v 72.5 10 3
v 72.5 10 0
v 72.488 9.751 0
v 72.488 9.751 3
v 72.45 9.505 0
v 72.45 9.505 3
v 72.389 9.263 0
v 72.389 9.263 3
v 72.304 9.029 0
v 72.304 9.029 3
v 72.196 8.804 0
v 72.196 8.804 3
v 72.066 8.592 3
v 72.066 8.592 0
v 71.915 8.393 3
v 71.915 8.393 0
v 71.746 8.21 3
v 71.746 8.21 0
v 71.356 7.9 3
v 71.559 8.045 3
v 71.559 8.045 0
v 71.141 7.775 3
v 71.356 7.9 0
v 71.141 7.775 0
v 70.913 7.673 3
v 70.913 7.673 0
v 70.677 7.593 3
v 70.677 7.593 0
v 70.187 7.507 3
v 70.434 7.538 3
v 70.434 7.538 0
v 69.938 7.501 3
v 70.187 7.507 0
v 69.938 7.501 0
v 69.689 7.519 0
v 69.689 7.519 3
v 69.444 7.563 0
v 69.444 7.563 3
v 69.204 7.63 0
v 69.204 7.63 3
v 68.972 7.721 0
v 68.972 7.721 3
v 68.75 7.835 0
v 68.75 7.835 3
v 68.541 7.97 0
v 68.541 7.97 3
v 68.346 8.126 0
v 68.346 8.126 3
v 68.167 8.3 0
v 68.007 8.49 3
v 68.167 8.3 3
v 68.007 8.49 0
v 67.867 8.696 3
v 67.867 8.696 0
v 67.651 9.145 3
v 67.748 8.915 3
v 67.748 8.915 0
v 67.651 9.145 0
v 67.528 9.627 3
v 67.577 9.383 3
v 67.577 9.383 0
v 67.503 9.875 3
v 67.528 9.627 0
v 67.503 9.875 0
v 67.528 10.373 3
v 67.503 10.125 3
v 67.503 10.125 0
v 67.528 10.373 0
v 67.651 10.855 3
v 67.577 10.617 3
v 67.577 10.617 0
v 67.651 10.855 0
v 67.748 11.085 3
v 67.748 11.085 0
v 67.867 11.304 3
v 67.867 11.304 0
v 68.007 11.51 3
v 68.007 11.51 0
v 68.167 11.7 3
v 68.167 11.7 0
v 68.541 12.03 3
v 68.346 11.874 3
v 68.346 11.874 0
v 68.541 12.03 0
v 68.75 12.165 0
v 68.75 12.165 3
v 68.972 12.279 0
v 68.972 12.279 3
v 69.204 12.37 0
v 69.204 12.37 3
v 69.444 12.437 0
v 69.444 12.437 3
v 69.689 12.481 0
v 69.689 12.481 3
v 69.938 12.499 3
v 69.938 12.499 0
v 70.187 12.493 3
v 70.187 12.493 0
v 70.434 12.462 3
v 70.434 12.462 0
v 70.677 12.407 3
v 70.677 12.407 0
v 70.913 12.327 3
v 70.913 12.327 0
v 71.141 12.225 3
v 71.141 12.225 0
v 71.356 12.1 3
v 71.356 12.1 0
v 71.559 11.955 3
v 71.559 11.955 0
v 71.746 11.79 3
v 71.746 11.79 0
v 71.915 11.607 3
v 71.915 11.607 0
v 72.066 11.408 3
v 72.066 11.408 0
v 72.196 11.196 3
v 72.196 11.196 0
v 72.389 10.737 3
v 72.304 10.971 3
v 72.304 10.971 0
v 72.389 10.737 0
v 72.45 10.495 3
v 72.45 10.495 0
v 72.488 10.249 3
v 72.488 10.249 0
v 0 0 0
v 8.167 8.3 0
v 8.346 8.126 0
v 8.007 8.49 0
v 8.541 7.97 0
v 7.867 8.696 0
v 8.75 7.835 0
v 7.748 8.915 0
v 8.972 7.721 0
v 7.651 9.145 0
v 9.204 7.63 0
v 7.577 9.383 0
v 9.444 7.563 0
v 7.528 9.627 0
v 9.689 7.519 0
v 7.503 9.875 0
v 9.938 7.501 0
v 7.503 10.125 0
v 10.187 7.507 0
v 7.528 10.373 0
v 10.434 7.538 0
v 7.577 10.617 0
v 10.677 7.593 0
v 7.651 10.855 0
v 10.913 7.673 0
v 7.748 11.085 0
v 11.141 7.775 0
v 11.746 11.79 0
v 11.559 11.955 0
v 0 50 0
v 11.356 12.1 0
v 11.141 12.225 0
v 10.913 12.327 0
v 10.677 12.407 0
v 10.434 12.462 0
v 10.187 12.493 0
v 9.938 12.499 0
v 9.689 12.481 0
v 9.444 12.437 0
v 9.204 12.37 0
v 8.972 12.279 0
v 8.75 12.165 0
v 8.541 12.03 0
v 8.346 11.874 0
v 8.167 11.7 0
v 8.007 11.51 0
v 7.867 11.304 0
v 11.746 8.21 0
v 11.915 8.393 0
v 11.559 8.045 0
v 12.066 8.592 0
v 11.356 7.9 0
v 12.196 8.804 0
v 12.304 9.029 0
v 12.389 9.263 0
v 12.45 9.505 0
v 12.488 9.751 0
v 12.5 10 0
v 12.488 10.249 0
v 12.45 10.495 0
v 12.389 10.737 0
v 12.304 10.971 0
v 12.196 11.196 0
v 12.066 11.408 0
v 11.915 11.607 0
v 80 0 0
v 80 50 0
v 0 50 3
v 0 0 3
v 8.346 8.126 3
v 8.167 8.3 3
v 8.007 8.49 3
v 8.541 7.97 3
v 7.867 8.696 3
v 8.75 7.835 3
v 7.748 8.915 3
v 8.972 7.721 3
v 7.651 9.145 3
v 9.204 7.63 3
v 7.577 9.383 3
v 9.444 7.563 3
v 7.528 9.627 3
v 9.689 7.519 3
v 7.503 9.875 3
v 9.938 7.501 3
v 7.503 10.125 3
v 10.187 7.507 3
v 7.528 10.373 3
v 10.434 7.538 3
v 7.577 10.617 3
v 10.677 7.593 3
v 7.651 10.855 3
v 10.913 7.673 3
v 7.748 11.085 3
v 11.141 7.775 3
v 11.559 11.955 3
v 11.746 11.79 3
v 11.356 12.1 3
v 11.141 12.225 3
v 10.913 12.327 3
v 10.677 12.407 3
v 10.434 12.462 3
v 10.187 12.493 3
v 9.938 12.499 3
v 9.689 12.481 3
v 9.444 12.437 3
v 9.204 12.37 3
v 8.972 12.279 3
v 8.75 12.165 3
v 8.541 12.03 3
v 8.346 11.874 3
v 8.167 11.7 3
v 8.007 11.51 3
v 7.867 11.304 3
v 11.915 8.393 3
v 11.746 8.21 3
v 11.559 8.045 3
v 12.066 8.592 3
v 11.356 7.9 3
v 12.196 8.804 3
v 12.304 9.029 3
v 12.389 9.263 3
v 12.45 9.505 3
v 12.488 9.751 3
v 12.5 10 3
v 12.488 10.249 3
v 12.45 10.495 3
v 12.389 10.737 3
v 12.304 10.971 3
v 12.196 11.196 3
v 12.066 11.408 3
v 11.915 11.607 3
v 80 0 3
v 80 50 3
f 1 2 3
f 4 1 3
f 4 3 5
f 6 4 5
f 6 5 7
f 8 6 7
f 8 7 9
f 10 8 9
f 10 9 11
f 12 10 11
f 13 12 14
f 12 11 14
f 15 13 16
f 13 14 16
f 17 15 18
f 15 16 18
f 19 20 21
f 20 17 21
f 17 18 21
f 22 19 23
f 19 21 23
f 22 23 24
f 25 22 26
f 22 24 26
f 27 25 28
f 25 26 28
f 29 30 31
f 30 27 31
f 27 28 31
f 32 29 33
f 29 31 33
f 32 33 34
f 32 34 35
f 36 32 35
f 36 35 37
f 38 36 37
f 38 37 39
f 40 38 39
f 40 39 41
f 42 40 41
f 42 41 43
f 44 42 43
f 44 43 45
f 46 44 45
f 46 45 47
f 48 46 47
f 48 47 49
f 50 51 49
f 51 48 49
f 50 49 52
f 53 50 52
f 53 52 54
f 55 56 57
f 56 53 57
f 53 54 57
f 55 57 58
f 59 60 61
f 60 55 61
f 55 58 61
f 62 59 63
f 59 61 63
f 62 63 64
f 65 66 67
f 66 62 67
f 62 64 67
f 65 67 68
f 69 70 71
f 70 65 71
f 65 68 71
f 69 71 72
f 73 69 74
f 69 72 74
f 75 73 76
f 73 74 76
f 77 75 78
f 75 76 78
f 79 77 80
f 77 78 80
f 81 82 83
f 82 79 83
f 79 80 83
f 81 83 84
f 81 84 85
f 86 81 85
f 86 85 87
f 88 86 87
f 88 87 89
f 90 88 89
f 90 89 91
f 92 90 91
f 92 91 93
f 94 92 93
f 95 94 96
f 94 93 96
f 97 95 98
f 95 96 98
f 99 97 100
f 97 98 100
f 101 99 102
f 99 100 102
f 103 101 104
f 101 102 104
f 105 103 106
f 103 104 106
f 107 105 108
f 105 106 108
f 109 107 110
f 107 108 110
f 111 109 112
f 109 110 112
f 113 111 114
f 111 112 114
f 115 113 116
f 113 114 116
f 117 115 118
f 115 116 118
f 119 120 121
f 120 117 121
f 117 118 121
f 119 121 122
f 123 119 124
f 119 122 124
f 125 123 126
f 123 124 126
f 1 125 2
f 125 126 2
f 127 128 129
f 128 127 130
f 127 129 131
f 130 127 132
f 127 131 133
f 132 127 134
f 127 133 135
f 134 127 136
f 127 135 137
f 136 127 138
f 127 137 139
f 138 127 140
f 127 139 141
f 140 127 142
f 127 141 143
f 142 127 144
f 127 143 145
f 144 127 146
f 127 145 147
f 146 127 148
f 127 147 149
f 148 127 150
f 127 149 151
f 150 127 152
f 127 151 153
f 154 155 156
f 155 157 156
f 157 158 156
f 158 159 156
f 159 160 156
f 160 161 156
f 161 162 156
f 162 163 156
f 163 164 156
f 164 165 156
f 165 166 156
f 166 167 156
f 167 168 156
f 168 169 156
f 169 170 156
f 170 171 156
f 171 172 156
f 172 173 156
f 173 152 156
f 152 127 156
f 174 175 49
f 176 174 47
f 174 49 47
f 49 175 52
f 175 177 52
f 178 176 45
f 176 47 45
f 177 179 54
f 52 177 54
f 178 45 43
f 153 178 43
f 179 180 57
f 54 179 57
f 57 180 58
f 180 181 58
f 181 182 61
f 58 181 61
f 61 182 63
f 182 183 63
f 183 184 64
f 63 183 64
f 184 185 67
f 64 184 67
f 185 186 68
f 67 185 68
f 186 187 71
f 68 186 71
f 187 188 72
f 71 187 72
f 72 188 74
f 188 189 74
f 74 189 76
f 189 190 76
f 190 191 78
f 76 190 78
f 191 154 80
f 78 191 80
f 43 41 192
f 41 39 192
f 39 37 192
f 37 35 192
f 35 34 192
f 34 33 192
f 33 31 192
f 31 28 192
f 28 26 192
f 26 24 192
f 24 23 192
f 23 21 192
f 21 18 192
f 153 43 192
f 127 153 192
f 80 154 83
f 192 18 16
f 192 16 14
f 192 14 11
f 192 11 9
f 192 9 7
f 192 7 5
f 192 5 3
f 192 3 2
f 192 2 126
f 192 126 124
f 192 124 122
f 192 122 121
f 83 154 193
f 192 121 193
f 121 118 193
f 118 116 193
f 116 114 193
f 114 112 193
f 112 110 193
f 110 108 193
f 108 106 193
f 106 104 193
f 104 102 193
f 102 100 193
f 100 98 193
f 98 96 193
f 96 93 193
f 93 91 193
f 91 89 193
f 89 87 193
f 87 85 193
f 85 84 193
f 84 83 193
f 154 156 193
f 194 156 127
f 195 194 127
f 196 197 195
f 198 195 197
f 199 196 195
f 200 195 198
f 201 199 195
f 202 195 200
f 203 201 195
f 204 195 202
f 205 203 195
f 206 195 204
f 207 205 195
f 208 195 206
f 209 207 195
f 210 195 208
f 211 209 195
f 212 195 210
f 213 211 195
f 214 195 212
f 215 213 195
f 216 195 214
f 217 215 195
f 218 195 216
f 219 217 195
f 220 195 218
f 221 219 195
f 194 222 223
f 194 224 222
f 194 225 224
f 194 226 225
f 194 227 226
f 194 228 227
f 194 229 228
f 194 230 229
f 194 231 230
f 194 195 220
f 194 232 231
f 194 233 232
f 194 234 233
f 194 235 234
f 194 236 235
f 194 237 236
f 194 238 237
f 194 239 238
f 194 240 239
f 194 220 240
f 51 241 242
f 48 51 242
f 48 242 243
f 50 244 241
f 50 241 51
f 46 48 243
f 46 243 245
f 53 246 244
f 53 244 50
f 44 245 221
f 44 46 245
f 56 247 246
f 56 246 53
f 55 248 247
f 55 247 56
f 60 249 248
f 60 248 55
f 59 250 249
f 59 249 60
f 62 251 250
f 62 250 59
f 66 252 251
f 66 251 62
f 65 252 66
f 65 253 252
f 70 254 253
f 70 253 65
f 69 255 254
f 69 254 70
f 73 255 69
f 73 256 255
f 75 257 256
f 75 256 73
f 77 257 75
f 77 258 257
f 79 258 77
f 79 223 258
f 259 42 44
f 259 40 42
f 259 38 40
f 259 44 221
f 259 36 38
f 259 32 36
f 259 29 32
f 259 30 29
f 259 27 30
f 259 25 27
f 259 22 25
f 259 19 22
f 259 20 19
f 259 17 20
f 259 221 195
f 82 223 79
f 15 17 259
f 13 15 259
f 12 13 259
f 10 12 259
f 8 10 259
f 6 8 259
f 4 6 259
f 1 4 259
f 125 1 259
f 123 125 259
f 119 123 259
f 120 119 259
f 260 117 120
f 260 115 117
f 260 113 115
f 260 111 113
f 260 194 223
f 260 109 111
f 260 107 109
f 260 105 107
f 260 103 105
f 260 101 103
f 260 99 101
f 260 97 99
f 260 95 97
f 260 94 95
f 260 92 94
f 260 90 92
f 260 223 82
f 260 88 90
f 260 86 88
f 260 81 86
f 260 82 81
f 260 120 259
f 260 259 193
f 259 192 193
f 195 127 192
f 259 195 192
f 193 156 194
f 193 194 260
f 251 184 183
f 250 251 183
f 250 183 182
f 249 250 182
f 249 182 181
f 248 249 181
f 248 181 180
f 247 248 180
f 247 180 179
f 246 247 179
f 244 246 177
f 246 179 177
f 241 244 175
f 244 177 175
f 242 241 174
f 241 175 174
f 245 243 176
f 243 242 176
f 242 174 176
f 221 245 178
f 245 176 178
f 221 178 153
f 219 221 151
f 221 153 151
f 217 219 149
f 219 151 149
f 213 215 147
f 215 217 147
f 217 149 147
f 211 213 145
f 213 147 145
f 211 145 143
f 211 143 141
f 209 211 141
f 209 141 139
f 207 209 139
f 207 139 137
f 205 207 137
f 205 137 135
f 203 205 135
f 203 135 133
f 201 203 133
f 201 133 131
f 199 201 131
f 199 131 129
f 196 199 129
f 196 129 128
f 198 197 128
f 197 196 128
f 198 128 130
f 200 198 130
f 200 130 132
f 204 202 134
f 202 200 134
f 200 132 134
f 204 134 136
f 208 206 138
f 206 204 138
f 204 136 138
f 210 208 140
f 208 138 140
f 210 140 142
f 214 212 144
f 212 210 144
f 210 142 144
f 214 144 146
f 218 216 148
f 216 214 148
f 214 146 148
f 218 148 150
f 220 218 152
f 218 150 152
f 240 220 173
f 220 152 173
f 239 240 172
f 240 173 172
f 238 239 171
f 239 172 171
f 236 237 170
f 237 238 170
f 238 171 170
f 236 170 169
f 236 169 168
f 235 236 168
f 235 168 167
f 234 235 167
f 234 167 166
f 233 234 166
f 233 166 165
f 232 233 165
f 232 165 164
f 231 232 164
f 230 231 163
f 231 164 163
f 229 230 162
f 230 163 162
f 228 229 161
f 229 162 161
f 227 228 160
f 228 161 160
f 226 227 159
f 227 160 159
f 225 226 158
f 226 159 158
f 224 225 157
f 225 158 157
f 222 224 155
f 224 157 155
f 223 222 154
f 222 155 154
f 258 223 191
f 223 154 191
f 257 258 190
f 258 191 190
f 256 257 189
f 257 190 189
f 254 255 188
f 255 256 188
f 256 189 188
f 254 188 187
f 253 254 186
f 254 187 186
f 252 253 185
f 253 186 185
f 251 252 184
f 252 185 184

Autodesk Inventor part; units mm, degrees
ref_plane "YZ Plane" through (0, 0, 0) normal (1, 0, 0) x (0, 1, 0)
ref_plane "XZ Plane" through (0, 0, 0) normal (0, 1, 0) x (-1, 0, 0)
ref_plane "XY Plane" through (0, 0, 0) normal (0, 0, 1) x (1, 0, 0)
sketch "スケッチ1" plane through (0, 0, 0) normal (0, 0, 1) x (1, 0, 0)
  line L0 (0, 0) -> (80, 0)
  line L1 (80, 0) -> (80, 50)
  line L2 (40, 0) -> (40, 73.3333) construction
  line L3 (0, 50) -> (0, 0)
  circle A0 centre (10, 10) radius 2.5
  circle A1 centre (70, 10) radius 2.5
  line L4 (10, 10) -> (70, 10) construction
  line L5 (0, 50) -> (80, 50)
  dimension "d2" = 80
  dimension "d6" = 5
  dimension "d7" = 10
  dimension "d14" = 10
  dimension "d17" = 50
extrude "押し出し1" add sketch "スケッチ1" along normal blind 3
properties part number "車軸受け板"
